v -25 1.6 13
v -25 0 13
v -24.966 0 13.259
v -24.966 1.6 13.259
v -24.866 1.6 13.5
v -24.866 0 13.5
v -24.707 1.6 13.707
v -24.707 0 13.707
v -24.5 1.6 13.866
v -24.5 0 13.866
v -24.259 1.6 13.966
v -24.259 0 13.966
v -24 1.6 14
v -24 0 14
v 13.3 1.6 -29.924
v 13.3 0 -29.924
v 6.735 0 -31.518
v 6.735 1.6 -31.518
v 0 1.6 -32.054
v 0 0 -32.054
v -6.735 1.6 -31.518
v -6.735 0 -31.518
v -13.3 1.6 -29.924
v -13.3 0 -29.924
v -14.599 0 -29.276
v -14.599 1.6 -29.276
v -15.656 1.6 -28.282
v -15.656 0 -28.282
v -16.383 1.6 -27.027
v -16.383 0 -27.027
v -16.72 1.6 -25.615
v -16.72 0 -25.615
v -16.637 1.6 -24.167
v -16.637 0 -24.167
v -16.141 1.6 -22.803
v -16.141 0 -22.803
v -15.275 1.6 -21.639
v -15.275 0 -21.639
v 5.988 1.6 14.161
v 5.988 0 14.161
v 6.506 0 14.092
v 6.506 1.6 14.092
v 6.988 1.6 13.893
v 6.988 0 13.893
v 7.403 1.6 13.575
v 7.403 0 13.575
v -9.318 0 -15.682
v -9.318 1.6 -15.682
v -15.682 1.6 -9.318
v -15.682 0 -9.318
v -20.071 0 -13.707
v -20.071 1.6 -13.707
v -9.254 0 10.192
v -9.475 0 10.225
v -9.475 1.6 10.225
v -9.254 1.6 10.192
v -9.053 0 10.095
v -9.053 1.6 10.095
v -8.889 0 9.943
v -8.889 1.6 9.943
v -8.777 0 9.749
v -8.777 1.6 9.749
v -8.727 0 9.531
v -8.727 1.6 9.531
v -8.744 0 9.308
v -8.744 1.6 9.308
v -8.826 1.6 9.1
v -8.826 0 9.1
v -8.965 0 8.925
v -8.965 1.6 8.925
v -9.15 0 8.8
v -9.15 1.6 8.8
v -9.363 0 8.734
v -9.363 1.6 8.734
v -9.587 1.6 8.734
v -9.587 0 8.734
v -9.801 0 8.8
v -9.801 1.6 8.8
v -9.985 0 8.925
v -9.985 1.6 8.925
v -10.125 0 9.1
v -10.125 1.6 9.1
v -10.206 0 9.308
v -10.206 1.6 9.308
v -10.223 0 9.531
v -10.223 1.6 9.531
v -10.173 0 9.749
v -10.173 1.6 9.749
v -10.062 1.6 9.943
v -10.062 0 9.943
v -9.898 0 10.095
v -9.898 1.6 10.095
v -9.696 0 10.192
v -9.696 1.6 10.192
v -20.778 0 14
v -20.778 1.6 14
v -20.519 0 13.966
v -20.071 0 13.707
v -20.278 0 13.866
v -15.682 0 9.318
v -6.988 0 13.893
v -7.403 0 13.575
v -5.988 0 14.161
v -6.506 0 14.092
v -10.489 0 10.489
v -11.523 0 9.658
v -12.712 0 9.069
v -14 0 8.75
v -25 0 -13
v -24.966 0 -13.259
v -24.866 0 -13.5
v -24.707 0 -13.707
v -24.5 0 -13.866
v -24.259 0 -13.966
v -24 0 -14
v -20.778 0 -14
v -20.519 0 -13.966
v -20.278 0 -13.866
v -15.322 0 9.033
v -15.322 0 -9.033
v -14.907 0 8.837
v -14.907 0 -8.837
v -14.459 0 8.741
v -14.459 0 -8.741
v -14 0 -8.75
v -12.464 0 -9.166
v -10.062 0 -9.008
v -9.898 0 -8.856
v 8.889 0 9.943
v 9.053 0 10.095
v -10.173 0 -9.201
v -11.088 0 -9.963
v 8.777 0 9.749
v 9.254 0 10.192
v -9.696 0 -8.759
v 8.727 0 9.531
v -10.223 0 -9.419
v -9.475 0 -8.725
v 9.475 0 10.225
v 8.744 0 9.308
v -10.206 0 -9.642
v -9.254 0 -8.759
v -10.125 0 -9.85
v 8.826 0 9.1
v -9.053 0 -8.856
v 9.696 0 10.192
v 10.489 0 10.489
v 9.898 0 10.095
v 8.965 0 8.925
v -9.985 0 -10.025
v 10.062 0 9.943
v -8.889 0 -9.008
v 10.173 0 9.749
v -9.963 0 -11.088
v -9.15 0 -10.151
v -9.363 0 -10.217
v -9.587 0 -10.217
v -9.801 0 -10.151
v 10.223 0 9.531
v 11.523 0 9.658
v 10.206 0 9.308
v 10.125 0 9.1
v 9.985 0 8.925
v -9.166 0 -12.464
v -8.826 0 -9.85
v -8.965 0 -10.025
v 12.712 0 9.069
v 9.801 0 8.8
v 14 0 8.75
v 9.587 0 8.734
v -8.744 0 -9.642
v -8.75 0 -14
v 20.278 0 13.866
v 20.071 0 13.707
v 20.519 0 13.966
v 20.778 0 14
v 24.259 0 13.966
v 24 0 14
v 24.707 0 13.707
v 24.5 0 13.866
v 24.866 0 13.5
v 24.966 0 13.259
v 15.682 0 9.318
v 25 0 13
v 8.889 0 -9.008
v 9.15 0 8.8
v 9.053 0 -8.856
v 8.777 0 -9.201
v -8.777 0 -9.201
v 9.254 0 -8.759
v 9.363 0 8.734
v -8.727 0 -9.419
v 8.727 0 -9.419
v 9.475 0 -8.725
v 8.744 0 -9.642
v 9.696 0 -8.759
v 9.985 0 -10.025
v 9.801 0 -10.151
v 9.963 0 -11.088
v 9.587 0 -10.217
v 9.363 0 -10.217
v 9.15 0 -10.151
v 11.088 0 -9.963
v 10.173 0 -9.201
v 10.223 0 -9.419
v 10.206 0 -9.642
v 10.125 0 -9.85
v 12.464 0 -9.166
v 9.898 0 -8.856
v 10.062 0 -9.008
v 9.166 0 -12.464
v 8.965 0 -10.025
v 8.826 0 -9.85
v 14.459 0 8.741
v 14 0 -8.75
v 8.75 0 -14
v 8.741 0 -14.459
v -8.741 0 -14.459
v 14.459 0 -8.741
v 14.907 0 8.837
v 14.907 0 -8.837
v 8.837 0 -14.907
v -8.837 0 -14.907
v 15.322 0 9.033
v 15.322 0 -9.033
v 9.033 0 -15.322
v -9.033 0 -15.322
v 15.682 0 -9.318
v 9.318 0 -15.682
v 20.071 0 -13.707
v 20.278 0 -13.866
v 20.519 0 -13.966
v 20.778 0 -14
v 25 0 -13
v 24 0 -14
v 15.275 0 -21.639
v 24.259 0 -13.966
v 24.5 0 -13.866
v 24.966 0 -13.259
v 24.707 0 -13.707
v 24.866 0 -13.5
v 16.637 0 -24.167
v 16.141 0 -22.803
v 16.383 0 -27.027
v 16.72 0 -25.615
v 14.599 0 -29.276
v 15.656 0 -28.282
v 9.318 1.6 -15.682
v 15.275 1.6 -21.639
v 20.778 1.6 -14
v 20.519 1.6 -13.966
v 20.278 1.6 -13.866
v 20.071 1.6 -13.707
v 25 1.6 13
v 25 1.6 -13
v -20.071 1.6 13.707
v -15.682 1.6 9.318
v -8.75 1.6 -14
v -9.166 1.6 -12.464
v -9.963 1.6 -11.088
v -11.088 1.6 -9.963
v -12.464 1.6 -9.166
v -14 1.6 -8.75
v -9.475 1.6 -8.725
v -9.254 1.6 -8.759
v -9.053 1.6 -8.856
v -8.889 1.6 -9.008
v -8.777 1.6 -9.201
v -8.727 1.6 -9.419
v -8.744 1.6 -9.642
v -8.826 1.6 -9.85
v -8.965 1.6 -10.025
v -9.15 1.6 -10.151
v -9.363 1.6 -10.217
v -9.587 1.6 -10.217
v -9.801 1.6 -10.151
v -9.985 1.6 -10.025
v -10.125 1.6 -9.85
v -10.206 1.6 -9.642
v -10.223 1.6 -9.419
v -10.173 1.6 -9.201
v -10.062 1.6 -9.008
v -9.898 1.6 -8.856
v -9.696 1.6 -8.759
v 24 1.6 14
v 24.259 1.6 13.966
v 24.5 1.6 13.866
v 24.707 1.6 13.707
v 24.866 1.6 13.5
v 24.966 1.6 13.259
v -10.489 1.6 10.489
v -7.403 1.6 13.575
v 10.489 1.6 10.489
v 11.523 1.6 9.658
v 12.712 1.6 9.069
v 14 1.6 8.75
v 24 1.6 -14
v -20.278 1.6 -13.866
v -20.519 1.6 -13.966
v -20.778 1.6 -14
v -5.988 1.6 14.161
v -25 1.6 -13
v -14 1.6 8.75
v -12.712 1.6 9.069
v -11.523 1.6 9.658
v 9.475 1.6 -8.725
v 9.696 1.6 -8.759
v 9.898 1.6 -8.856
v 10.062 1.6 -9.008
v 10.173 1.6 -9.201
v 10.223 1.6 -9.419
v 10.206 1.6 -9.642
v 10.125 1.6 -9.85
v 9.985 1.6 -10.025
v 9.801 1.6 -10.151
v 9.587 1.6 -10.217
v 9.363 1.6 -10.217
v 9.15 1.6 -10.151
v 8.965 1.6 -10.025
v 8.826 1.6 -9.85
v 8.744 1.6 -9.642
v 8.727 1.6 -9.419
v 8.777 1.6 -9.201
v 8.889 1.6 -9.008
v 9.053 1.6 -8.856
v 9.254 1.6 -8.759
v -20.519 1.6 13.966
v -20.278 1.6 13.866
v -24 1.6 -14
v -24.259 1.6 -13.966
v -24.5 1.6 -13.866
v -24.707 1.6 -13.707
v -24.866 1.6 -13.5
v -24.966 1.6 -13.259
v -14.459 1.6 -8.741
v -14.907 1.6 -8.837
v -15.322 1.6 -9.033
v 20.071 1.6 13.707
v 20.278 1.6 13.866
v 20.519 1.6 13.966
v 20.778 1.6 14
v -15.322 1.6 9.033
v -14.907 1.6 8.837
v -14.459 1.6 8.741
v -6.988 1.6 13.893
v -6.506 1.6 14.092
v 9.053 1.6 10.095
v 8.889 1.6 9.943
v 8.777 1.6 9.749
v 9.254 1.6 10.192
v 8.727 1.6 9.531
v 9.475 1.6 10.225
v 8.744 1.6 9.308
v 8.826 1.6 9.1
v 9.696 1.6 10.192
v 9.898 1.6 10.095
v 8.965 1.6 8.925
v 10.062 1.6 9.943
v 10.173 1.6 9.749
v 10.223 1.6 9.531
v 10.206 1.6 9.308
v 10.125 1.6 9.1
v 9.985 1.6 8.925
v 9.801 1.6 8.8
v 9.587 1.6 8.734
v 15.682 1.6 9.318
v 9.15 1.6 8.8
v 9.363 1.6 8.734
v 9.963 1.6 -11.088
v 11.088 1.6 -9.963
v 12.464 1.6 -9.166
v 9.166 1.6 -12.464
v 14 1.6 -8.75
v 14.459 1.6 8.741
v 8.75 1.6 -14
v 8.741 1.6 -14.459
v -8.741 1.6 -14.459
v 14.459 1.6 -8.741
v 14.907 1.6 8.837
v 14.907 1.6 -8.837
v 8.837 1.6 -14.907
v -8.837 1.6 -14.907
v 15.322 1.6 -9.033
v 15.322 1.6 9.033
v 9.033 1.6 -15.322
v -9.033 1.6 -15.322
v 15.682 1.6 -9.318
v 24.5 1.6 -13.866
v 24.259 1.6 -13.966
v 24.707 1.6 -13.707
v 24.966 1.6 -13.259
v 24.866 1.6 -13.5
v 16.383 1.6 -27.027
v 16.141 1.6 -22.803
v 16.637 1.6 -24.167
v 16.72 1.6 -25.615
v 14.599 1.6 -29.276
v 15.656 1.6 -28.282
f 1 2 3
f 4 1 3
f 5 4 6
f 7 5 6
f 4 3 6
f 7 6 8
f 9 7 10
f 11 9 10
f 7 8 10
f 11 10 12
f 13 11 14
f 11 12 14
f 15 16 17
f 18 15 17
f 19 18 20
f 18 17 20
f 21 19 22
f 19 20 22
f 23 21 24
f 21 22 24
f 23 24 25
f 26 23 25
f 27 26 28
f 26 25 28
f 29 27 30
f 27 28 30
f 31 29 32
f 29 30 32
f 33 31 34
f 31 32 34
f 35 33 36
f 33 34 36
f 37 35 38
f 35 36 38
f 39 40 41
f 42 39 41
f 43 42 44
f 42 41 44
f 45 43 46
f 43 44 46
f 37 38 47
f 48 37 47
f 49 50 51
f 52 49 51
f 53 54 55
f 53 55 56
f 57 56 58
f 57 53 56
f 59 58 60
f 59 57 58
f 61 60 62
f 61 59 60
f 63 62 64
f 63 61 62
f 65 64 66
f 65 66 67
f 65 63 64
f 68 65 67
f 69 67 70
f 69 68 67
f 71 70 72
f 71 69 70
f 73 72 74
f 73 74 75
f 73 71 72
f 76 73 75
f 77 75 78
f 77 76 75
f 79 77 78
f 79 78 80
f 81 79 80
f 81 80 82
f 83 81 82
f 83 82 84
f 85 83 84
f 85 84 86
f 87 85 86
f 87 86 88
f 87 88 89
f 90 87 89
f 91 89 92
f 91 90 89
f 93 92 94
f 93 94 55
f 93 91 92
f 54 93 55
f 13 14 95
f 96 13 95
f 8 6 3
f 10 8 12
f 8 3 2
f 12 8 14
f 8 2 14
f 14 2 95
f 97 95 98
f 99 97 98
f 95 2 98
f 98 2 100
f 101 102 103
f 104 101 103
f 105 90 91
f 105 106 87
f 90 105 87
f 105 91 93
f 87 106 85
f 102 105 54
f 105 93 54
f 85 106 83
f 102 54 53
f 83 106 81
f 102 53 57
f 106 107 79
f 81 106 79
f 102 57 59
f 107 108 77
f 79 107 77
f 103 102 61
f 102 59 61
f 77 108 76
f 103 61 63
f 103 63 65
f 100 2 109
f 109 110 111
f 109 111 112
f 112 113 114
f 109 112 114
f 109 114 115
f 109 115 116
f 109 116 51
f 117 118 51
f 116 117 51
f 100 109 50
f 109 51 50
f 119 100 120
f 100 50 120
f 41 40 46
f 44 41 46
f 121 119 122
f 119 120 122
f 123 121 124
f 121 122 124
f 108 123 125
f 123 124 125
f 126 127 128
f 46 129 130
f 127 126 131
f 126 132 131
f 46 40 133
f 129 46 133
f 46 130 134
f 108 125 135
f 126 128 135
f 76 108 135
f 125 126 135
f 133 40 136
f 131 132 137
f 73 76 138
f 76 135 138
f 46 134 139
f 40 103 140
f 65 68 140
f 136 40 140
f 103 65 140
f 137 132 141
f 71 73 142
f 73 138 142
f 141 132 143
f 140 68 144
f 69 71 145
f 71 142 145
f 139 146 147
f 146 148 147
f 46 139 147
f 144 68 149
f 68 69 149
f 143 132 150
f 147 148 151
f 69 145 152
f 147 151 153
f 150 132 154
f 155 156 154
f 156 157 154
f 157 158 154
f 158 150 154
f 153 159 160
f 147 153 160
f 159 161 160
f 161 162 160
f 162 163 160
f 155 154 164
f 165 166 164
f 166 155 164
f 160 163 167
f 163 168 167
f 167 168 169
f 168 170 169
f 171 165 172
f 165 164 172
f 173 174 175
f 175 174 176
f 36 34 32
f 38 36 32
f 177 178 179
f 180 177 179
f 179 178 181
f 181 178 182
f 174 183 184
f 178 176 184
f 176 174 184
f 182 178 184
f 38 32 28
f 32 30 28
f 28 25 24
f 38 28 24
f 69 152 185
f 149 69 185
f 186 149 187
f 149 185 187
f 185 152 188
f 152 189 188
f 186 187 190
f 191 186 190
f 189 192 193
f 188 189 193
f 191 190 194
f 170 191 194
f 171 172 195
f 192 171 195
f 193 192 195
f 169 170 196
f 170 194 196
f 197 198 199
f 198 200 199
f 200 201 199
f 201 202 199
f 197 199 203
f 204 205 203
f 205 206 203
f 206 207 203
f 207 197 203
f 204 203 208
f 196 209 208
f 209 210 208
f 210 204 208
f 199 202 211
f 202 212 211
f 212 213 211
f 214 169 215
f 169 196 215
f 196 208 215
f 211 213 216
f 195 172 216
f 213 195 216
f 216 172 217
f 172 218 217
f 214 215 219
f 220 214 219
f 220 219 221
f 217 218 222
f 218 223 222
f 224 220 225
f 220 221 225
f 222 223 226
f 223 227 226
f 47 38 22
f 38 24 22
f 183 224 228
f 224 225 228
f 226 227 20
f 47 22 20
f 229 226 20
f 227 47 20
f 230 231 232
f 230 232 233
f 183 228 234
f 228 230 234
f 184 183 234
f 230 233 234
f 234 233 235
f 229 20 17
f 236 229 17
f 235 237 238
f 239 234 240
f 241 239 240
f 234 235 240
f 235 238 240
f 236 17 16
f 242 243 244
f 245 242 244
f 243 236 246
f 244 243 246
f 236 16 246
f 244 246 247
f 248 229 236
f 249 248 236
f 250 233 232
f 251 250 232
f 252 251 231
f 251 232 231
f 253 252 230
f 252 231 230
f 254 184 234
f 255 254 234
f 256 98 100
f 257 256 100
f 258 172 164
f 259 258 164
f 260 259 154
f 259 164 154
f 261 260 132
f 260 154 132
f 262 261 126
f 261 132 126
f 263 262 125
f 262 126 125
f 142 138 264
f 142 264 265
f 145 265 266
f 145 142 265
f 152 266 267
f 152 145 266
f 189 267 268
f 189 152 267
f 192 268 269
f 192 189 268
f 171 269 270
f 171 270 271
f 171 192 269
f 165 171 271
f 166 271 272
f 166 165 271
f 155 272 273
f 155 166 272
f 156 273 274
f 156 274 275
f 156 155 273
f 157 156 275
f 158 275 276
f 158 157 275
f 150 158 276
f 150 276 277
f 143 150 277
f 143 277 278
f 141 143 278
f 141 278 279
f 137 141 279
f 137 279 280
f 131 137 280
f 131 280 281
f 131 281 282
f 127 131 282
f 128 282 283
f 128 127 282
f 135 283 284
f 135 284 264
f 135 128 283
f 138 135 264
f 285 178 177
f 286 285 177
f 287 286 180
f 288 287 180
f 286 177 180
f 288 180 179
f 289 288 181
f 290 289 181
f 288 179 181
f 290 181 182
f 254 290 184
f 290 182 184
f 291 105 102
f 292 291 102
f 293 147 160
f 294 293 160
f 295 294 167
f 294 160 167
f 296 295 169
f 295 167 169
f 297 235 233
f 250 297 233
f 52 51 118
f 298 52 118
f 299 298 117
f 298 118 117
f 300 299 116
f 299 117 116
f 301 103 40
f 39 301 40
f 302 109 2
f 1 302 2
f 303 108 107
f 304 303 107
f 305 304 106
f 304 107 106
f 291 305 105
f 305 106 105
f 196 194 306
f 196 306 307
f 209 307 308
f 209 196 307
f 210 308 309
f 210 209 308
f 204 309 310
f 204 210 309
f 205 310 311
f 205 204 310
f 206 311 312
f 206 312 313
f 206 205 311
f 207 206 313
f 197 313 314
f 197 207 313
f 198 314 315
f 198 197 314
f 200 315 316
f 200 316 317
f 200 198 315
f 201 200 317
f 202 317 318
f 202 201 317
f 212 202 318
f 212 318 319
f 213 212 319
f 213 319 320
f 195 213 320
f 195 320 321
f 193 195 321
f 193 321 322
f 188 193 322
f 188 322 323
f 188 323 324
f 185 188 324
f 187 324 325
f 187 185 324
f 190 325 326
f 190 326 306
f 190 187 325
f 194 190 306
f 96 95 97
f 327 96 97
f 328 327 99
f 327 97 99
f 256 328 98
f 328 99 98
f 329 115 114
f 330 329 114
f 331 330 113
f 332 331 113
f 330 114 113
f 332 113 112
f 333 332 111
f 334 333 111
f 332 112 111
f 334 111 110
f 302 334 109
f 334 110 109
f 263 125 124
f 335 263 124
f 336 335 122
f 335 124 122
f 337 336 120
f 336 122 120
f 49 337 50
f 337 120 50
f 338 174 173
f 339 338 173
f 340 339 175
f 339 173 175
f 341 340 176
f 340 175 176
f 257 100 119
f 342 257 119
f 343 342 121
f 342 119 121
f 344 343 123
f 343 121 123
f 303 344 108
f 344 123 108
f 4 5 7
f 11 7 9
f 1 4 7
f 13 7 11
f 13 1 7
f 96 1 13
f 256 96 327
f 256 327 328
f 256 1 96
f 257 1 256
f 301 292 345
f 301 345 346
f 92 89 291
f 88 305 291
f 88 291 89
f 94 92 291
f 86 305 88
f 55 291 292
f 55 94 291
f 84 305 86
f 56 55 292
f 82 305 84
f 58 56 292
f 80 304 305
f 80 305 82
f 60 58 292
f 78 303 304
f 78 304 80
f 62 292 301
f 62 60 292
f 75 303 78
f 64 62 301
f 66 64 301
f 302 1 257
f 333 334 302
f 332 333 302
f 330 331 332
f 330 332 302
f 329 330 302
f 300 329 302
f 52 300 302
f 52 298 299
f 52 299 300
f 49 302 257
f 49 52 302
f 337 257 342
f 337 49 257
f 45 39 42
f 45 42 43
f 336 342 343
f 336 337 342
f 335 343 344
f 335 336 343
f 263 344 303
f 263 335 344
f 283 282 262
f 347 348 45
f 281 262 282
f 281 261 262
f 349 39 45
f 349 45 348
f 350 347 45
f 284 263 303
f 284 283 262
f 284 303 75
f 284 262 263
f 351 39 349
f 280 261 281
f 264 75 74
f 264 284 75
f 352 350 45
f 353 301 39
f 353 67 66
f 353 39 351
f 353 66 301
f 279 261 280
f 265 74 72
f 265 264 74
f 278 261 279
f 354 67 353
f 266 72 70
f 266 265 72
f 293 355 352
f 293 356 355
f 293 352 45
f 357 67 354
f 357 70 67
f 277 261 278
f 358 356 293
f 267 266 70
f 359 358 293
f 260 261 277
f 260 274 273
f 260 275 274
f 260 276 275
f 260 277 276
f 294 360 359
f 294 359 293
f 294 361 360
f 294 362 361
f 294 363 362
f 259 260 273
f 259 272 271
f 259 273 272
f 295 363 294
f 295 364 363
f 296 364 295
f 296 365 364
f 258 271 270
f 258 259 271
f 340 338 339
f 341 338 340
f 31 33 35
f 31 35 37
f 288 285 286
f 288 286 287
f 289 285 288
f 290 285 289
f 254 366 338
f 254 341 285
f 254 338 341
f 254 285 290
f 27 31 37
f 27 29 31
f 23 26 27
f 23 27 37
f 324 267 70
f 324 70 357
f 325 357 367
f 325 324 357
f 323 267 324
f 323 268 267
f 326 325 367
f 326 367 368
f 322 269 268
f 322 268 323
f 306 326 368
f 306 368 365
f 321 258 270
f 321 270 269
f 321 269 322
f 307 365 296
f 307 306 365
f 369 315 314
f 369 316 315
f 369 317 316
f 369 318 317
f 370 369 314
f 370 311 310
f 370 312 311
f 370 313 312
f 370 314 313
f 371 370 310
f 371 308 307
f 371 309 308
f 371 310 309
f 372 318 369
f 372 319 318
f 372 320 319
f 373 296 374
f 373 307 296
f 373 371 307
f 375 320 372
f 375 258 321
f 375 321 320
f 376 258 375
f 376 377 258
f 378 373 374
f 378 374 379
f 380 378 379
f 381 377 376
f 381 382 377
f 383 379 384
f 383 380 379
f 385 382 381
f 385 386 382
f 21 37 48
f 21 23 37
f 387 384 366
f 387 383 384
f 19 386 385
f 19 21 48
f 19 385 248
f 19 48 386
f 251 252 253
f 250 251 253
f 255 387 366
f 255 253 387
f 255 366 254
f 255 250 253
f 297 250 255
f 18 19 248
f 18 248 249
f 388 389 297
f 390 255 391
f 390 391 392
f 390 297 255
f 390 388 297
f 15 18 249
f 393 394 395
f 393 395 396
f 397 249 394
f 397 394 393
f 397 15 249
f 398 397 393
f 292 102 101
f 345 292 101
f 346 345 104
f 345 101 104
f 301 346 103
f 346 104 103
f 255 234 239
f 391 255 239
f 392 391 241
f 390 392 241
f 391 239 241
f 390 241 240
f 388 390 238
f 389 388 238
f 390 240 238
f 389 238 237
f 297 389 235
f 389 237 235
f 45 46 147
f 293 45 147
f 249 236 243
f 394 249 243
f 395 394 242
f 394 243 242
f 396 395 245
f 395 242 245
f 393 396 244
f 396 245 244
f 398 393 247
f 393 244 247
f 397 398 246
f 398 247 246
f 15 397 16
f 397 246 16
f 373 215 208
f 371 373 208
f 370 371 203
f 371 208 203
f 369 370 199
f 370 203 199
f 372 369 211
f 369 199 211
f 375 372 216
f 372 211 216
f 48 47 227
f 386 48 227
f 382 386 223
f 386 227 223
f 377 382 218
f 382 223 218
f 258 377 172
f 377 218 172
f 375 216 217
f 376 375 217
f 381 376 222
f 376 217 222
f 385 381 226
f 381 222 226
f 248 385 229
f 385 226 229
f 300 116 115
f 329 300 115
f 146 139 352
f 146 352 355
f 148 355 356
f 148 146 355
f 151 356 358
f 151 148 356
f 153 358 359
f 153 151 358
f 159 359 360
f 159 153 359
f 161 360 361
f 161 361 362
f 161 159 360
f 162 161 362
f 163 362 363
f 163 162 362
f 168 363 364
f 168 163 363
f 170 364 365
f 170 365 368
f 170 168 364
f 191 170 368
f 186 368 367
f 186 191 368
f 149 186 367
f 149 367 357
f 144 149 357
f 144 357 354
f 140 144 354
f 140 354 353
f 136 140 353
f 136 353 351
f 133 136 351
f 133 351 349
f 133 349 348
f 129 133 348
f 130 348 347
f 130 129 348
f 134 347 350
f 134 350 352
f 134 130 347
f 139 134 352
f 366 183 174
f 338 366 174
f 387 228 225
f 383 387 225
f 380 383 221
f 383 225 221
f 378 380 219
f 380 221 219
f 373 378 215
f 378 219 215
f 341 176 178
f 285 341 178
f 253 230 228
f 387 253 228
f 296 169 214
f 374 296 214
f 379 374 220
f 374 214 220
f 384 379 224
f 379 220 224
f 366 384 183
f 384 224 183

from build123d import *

# Parameters (mm, degrees)
SKETCH1_R           = 0.75
BOSS_EXTRUDE1_DEPTH = 1.6


with BuildPart() as part:
    # Sketch1 → Boss-Extrude1 (new body)
    with BuildSketch(Plane(origin=(0, 0, 0), x_dir=(1, 0, 0), z_dir=(0, 1, 0))):
        with BuildLine():
            Line((-20.071067812, -13.707106781), (-15.681770053, -9.317809022))
            ThreePointArc((-15.681770053, -9.317809022), (-14.907327841, -8.837110286), (-14, -8.75))
            ThreePointArc((-14, -8.75), (-12.101565565, -9.330988792), (-10.488732177, -10.488732177))
            Line((-10.488732177, -10.488732177), (-7.402704805, -13.57475955))
            ThreePointArc((-7.402704805, -13.57475955), (-6.753858107, -14.008305053), (-5.988491243, -14.160545988))
            Line((-5.988491243, -14.160545988), (5.988491243, -14.160545988))
            ThreePointArc((5.988491243, -14.160545988), (6.753858107, -14.008305053), (7.402704805, -13.57475955))
            Line((7.402704805, -13.57475955), (10.488732177, -10.488732177))
            ThreePointArc((10.488732177, -10.488732177), (12.101565565, -9.330988792), (14, -8.75))
            ThreePointArc((14, -8.75), (14.907327841, -8.837110286), (15.681770053, -9.317809022))
            Line((15.681770053, -9.317809022), (20.071067812, -13.707106781))
            ThreePointArc((20.071067812, -13.707106781), (20.395491161, -13.923879533), (20.778174593, -14))
            Line((20.778174593, -14), (24, -14))
            ThreePointArc((24, -14), (24.707106781, -13.707106781), (25, -13))
            Line((25, -13), (25, 13))
            ThreePointArc((25, 13), (24.707106781, 13.707106781), (24, 14))
            Line((24, 14), (20.778174593, 14))
            ThreePointArc((20.778174593, 14), (20.395491161, 13.923879533), (20.071067812, 13.707106781))
            Line((20.071067812, 13.707106781), (15.681770053, 9.317809022))
            ThreePointArc((15.681770053, 9.317809022), (14.907327841, 8.837110286), (14, 8.75))
            ThreePointArc((14, 8.75), (10.488732177, 10.488732177), (8.75, 14))
            ThreePointArc((8.75, 14), (8.837110286, 14.907327841), (9.317809022, 15.681770053))
            Line((9.317809022, 15.681770053), (15.27484739, 21.638808421))
            ThreePointArc((15.27484739, 21.638808421), (16.603119619, 26.333389297), (13.300387568, 29.924399979))
            ThreePointArc((13.300387568, 29.924399979), (0, 32.053914601), (-13.300387568, 29.924399979))
            ThreePointArc((-13.300387568, 29.924399979), (-16.603119619, 26.333389297), (-15.27484739, 21.638808421))
            Line((-15.27484739, 21.638808421), (-9.317809022, 15.681770053))
            ThreePointArc((-9.317809022, 15.681770053), (-8.837110286, 14.907327841), (-8.75, 14))
            ThreePointArc((-8.75, 14), (-10.488732177, 10.488732177), (-14, 8.75))
            ThreePointArc((-14, 8.75), (-14.907327841, 8.837110286), (-15.681770053, 9.317809022))
            Line((-15.681770053, 9.317809022), (-20.071067812, 13.707106781))
            ThreePointArc((-20.071067812, 13.707106781), (-20.395491161, 13.923879533), (-20.778174593, 14))
            Line((-20.778174593, 14), (-24, 14))
            ThreePointArc((-24, 14), (-24.707106781, 13.707106781), (-25, 13))
            Line((-25, 13), (-25, -13))
            ThreePointArc((-25, -13), (-24.707106781, -13.707106781), (-24, -14))
            Line((-24, -14), (-20.778174593, -14))
            ThreePointArc((-20.778174593, -14), (-20.395491161, -13.923879533), (-20.071067812, -13.707106781))
        make_face()
        with Locations((-9.475230868, 9.475230868)):
            Circle(SKETCH1_R, mode=Mode.SUBTRACT)
        with Locations((9.475230868, -9.475230868)):
            Circle(SKETCH1_R, mode=Mode.SUBTRACT)
        with Locations((9.475230868, 9.475230868)):
            Circle(SKETCH1_R, mode=Mode.SUBTRACT)
        with Locations((-9.475230868, -9.475230868)):
            Circle(SKETCH1_R, mode=Mode.SUBTRACT)
    extrude(amount=BOSS_EXTRUDE1_DEPTH)


solid = part.part
